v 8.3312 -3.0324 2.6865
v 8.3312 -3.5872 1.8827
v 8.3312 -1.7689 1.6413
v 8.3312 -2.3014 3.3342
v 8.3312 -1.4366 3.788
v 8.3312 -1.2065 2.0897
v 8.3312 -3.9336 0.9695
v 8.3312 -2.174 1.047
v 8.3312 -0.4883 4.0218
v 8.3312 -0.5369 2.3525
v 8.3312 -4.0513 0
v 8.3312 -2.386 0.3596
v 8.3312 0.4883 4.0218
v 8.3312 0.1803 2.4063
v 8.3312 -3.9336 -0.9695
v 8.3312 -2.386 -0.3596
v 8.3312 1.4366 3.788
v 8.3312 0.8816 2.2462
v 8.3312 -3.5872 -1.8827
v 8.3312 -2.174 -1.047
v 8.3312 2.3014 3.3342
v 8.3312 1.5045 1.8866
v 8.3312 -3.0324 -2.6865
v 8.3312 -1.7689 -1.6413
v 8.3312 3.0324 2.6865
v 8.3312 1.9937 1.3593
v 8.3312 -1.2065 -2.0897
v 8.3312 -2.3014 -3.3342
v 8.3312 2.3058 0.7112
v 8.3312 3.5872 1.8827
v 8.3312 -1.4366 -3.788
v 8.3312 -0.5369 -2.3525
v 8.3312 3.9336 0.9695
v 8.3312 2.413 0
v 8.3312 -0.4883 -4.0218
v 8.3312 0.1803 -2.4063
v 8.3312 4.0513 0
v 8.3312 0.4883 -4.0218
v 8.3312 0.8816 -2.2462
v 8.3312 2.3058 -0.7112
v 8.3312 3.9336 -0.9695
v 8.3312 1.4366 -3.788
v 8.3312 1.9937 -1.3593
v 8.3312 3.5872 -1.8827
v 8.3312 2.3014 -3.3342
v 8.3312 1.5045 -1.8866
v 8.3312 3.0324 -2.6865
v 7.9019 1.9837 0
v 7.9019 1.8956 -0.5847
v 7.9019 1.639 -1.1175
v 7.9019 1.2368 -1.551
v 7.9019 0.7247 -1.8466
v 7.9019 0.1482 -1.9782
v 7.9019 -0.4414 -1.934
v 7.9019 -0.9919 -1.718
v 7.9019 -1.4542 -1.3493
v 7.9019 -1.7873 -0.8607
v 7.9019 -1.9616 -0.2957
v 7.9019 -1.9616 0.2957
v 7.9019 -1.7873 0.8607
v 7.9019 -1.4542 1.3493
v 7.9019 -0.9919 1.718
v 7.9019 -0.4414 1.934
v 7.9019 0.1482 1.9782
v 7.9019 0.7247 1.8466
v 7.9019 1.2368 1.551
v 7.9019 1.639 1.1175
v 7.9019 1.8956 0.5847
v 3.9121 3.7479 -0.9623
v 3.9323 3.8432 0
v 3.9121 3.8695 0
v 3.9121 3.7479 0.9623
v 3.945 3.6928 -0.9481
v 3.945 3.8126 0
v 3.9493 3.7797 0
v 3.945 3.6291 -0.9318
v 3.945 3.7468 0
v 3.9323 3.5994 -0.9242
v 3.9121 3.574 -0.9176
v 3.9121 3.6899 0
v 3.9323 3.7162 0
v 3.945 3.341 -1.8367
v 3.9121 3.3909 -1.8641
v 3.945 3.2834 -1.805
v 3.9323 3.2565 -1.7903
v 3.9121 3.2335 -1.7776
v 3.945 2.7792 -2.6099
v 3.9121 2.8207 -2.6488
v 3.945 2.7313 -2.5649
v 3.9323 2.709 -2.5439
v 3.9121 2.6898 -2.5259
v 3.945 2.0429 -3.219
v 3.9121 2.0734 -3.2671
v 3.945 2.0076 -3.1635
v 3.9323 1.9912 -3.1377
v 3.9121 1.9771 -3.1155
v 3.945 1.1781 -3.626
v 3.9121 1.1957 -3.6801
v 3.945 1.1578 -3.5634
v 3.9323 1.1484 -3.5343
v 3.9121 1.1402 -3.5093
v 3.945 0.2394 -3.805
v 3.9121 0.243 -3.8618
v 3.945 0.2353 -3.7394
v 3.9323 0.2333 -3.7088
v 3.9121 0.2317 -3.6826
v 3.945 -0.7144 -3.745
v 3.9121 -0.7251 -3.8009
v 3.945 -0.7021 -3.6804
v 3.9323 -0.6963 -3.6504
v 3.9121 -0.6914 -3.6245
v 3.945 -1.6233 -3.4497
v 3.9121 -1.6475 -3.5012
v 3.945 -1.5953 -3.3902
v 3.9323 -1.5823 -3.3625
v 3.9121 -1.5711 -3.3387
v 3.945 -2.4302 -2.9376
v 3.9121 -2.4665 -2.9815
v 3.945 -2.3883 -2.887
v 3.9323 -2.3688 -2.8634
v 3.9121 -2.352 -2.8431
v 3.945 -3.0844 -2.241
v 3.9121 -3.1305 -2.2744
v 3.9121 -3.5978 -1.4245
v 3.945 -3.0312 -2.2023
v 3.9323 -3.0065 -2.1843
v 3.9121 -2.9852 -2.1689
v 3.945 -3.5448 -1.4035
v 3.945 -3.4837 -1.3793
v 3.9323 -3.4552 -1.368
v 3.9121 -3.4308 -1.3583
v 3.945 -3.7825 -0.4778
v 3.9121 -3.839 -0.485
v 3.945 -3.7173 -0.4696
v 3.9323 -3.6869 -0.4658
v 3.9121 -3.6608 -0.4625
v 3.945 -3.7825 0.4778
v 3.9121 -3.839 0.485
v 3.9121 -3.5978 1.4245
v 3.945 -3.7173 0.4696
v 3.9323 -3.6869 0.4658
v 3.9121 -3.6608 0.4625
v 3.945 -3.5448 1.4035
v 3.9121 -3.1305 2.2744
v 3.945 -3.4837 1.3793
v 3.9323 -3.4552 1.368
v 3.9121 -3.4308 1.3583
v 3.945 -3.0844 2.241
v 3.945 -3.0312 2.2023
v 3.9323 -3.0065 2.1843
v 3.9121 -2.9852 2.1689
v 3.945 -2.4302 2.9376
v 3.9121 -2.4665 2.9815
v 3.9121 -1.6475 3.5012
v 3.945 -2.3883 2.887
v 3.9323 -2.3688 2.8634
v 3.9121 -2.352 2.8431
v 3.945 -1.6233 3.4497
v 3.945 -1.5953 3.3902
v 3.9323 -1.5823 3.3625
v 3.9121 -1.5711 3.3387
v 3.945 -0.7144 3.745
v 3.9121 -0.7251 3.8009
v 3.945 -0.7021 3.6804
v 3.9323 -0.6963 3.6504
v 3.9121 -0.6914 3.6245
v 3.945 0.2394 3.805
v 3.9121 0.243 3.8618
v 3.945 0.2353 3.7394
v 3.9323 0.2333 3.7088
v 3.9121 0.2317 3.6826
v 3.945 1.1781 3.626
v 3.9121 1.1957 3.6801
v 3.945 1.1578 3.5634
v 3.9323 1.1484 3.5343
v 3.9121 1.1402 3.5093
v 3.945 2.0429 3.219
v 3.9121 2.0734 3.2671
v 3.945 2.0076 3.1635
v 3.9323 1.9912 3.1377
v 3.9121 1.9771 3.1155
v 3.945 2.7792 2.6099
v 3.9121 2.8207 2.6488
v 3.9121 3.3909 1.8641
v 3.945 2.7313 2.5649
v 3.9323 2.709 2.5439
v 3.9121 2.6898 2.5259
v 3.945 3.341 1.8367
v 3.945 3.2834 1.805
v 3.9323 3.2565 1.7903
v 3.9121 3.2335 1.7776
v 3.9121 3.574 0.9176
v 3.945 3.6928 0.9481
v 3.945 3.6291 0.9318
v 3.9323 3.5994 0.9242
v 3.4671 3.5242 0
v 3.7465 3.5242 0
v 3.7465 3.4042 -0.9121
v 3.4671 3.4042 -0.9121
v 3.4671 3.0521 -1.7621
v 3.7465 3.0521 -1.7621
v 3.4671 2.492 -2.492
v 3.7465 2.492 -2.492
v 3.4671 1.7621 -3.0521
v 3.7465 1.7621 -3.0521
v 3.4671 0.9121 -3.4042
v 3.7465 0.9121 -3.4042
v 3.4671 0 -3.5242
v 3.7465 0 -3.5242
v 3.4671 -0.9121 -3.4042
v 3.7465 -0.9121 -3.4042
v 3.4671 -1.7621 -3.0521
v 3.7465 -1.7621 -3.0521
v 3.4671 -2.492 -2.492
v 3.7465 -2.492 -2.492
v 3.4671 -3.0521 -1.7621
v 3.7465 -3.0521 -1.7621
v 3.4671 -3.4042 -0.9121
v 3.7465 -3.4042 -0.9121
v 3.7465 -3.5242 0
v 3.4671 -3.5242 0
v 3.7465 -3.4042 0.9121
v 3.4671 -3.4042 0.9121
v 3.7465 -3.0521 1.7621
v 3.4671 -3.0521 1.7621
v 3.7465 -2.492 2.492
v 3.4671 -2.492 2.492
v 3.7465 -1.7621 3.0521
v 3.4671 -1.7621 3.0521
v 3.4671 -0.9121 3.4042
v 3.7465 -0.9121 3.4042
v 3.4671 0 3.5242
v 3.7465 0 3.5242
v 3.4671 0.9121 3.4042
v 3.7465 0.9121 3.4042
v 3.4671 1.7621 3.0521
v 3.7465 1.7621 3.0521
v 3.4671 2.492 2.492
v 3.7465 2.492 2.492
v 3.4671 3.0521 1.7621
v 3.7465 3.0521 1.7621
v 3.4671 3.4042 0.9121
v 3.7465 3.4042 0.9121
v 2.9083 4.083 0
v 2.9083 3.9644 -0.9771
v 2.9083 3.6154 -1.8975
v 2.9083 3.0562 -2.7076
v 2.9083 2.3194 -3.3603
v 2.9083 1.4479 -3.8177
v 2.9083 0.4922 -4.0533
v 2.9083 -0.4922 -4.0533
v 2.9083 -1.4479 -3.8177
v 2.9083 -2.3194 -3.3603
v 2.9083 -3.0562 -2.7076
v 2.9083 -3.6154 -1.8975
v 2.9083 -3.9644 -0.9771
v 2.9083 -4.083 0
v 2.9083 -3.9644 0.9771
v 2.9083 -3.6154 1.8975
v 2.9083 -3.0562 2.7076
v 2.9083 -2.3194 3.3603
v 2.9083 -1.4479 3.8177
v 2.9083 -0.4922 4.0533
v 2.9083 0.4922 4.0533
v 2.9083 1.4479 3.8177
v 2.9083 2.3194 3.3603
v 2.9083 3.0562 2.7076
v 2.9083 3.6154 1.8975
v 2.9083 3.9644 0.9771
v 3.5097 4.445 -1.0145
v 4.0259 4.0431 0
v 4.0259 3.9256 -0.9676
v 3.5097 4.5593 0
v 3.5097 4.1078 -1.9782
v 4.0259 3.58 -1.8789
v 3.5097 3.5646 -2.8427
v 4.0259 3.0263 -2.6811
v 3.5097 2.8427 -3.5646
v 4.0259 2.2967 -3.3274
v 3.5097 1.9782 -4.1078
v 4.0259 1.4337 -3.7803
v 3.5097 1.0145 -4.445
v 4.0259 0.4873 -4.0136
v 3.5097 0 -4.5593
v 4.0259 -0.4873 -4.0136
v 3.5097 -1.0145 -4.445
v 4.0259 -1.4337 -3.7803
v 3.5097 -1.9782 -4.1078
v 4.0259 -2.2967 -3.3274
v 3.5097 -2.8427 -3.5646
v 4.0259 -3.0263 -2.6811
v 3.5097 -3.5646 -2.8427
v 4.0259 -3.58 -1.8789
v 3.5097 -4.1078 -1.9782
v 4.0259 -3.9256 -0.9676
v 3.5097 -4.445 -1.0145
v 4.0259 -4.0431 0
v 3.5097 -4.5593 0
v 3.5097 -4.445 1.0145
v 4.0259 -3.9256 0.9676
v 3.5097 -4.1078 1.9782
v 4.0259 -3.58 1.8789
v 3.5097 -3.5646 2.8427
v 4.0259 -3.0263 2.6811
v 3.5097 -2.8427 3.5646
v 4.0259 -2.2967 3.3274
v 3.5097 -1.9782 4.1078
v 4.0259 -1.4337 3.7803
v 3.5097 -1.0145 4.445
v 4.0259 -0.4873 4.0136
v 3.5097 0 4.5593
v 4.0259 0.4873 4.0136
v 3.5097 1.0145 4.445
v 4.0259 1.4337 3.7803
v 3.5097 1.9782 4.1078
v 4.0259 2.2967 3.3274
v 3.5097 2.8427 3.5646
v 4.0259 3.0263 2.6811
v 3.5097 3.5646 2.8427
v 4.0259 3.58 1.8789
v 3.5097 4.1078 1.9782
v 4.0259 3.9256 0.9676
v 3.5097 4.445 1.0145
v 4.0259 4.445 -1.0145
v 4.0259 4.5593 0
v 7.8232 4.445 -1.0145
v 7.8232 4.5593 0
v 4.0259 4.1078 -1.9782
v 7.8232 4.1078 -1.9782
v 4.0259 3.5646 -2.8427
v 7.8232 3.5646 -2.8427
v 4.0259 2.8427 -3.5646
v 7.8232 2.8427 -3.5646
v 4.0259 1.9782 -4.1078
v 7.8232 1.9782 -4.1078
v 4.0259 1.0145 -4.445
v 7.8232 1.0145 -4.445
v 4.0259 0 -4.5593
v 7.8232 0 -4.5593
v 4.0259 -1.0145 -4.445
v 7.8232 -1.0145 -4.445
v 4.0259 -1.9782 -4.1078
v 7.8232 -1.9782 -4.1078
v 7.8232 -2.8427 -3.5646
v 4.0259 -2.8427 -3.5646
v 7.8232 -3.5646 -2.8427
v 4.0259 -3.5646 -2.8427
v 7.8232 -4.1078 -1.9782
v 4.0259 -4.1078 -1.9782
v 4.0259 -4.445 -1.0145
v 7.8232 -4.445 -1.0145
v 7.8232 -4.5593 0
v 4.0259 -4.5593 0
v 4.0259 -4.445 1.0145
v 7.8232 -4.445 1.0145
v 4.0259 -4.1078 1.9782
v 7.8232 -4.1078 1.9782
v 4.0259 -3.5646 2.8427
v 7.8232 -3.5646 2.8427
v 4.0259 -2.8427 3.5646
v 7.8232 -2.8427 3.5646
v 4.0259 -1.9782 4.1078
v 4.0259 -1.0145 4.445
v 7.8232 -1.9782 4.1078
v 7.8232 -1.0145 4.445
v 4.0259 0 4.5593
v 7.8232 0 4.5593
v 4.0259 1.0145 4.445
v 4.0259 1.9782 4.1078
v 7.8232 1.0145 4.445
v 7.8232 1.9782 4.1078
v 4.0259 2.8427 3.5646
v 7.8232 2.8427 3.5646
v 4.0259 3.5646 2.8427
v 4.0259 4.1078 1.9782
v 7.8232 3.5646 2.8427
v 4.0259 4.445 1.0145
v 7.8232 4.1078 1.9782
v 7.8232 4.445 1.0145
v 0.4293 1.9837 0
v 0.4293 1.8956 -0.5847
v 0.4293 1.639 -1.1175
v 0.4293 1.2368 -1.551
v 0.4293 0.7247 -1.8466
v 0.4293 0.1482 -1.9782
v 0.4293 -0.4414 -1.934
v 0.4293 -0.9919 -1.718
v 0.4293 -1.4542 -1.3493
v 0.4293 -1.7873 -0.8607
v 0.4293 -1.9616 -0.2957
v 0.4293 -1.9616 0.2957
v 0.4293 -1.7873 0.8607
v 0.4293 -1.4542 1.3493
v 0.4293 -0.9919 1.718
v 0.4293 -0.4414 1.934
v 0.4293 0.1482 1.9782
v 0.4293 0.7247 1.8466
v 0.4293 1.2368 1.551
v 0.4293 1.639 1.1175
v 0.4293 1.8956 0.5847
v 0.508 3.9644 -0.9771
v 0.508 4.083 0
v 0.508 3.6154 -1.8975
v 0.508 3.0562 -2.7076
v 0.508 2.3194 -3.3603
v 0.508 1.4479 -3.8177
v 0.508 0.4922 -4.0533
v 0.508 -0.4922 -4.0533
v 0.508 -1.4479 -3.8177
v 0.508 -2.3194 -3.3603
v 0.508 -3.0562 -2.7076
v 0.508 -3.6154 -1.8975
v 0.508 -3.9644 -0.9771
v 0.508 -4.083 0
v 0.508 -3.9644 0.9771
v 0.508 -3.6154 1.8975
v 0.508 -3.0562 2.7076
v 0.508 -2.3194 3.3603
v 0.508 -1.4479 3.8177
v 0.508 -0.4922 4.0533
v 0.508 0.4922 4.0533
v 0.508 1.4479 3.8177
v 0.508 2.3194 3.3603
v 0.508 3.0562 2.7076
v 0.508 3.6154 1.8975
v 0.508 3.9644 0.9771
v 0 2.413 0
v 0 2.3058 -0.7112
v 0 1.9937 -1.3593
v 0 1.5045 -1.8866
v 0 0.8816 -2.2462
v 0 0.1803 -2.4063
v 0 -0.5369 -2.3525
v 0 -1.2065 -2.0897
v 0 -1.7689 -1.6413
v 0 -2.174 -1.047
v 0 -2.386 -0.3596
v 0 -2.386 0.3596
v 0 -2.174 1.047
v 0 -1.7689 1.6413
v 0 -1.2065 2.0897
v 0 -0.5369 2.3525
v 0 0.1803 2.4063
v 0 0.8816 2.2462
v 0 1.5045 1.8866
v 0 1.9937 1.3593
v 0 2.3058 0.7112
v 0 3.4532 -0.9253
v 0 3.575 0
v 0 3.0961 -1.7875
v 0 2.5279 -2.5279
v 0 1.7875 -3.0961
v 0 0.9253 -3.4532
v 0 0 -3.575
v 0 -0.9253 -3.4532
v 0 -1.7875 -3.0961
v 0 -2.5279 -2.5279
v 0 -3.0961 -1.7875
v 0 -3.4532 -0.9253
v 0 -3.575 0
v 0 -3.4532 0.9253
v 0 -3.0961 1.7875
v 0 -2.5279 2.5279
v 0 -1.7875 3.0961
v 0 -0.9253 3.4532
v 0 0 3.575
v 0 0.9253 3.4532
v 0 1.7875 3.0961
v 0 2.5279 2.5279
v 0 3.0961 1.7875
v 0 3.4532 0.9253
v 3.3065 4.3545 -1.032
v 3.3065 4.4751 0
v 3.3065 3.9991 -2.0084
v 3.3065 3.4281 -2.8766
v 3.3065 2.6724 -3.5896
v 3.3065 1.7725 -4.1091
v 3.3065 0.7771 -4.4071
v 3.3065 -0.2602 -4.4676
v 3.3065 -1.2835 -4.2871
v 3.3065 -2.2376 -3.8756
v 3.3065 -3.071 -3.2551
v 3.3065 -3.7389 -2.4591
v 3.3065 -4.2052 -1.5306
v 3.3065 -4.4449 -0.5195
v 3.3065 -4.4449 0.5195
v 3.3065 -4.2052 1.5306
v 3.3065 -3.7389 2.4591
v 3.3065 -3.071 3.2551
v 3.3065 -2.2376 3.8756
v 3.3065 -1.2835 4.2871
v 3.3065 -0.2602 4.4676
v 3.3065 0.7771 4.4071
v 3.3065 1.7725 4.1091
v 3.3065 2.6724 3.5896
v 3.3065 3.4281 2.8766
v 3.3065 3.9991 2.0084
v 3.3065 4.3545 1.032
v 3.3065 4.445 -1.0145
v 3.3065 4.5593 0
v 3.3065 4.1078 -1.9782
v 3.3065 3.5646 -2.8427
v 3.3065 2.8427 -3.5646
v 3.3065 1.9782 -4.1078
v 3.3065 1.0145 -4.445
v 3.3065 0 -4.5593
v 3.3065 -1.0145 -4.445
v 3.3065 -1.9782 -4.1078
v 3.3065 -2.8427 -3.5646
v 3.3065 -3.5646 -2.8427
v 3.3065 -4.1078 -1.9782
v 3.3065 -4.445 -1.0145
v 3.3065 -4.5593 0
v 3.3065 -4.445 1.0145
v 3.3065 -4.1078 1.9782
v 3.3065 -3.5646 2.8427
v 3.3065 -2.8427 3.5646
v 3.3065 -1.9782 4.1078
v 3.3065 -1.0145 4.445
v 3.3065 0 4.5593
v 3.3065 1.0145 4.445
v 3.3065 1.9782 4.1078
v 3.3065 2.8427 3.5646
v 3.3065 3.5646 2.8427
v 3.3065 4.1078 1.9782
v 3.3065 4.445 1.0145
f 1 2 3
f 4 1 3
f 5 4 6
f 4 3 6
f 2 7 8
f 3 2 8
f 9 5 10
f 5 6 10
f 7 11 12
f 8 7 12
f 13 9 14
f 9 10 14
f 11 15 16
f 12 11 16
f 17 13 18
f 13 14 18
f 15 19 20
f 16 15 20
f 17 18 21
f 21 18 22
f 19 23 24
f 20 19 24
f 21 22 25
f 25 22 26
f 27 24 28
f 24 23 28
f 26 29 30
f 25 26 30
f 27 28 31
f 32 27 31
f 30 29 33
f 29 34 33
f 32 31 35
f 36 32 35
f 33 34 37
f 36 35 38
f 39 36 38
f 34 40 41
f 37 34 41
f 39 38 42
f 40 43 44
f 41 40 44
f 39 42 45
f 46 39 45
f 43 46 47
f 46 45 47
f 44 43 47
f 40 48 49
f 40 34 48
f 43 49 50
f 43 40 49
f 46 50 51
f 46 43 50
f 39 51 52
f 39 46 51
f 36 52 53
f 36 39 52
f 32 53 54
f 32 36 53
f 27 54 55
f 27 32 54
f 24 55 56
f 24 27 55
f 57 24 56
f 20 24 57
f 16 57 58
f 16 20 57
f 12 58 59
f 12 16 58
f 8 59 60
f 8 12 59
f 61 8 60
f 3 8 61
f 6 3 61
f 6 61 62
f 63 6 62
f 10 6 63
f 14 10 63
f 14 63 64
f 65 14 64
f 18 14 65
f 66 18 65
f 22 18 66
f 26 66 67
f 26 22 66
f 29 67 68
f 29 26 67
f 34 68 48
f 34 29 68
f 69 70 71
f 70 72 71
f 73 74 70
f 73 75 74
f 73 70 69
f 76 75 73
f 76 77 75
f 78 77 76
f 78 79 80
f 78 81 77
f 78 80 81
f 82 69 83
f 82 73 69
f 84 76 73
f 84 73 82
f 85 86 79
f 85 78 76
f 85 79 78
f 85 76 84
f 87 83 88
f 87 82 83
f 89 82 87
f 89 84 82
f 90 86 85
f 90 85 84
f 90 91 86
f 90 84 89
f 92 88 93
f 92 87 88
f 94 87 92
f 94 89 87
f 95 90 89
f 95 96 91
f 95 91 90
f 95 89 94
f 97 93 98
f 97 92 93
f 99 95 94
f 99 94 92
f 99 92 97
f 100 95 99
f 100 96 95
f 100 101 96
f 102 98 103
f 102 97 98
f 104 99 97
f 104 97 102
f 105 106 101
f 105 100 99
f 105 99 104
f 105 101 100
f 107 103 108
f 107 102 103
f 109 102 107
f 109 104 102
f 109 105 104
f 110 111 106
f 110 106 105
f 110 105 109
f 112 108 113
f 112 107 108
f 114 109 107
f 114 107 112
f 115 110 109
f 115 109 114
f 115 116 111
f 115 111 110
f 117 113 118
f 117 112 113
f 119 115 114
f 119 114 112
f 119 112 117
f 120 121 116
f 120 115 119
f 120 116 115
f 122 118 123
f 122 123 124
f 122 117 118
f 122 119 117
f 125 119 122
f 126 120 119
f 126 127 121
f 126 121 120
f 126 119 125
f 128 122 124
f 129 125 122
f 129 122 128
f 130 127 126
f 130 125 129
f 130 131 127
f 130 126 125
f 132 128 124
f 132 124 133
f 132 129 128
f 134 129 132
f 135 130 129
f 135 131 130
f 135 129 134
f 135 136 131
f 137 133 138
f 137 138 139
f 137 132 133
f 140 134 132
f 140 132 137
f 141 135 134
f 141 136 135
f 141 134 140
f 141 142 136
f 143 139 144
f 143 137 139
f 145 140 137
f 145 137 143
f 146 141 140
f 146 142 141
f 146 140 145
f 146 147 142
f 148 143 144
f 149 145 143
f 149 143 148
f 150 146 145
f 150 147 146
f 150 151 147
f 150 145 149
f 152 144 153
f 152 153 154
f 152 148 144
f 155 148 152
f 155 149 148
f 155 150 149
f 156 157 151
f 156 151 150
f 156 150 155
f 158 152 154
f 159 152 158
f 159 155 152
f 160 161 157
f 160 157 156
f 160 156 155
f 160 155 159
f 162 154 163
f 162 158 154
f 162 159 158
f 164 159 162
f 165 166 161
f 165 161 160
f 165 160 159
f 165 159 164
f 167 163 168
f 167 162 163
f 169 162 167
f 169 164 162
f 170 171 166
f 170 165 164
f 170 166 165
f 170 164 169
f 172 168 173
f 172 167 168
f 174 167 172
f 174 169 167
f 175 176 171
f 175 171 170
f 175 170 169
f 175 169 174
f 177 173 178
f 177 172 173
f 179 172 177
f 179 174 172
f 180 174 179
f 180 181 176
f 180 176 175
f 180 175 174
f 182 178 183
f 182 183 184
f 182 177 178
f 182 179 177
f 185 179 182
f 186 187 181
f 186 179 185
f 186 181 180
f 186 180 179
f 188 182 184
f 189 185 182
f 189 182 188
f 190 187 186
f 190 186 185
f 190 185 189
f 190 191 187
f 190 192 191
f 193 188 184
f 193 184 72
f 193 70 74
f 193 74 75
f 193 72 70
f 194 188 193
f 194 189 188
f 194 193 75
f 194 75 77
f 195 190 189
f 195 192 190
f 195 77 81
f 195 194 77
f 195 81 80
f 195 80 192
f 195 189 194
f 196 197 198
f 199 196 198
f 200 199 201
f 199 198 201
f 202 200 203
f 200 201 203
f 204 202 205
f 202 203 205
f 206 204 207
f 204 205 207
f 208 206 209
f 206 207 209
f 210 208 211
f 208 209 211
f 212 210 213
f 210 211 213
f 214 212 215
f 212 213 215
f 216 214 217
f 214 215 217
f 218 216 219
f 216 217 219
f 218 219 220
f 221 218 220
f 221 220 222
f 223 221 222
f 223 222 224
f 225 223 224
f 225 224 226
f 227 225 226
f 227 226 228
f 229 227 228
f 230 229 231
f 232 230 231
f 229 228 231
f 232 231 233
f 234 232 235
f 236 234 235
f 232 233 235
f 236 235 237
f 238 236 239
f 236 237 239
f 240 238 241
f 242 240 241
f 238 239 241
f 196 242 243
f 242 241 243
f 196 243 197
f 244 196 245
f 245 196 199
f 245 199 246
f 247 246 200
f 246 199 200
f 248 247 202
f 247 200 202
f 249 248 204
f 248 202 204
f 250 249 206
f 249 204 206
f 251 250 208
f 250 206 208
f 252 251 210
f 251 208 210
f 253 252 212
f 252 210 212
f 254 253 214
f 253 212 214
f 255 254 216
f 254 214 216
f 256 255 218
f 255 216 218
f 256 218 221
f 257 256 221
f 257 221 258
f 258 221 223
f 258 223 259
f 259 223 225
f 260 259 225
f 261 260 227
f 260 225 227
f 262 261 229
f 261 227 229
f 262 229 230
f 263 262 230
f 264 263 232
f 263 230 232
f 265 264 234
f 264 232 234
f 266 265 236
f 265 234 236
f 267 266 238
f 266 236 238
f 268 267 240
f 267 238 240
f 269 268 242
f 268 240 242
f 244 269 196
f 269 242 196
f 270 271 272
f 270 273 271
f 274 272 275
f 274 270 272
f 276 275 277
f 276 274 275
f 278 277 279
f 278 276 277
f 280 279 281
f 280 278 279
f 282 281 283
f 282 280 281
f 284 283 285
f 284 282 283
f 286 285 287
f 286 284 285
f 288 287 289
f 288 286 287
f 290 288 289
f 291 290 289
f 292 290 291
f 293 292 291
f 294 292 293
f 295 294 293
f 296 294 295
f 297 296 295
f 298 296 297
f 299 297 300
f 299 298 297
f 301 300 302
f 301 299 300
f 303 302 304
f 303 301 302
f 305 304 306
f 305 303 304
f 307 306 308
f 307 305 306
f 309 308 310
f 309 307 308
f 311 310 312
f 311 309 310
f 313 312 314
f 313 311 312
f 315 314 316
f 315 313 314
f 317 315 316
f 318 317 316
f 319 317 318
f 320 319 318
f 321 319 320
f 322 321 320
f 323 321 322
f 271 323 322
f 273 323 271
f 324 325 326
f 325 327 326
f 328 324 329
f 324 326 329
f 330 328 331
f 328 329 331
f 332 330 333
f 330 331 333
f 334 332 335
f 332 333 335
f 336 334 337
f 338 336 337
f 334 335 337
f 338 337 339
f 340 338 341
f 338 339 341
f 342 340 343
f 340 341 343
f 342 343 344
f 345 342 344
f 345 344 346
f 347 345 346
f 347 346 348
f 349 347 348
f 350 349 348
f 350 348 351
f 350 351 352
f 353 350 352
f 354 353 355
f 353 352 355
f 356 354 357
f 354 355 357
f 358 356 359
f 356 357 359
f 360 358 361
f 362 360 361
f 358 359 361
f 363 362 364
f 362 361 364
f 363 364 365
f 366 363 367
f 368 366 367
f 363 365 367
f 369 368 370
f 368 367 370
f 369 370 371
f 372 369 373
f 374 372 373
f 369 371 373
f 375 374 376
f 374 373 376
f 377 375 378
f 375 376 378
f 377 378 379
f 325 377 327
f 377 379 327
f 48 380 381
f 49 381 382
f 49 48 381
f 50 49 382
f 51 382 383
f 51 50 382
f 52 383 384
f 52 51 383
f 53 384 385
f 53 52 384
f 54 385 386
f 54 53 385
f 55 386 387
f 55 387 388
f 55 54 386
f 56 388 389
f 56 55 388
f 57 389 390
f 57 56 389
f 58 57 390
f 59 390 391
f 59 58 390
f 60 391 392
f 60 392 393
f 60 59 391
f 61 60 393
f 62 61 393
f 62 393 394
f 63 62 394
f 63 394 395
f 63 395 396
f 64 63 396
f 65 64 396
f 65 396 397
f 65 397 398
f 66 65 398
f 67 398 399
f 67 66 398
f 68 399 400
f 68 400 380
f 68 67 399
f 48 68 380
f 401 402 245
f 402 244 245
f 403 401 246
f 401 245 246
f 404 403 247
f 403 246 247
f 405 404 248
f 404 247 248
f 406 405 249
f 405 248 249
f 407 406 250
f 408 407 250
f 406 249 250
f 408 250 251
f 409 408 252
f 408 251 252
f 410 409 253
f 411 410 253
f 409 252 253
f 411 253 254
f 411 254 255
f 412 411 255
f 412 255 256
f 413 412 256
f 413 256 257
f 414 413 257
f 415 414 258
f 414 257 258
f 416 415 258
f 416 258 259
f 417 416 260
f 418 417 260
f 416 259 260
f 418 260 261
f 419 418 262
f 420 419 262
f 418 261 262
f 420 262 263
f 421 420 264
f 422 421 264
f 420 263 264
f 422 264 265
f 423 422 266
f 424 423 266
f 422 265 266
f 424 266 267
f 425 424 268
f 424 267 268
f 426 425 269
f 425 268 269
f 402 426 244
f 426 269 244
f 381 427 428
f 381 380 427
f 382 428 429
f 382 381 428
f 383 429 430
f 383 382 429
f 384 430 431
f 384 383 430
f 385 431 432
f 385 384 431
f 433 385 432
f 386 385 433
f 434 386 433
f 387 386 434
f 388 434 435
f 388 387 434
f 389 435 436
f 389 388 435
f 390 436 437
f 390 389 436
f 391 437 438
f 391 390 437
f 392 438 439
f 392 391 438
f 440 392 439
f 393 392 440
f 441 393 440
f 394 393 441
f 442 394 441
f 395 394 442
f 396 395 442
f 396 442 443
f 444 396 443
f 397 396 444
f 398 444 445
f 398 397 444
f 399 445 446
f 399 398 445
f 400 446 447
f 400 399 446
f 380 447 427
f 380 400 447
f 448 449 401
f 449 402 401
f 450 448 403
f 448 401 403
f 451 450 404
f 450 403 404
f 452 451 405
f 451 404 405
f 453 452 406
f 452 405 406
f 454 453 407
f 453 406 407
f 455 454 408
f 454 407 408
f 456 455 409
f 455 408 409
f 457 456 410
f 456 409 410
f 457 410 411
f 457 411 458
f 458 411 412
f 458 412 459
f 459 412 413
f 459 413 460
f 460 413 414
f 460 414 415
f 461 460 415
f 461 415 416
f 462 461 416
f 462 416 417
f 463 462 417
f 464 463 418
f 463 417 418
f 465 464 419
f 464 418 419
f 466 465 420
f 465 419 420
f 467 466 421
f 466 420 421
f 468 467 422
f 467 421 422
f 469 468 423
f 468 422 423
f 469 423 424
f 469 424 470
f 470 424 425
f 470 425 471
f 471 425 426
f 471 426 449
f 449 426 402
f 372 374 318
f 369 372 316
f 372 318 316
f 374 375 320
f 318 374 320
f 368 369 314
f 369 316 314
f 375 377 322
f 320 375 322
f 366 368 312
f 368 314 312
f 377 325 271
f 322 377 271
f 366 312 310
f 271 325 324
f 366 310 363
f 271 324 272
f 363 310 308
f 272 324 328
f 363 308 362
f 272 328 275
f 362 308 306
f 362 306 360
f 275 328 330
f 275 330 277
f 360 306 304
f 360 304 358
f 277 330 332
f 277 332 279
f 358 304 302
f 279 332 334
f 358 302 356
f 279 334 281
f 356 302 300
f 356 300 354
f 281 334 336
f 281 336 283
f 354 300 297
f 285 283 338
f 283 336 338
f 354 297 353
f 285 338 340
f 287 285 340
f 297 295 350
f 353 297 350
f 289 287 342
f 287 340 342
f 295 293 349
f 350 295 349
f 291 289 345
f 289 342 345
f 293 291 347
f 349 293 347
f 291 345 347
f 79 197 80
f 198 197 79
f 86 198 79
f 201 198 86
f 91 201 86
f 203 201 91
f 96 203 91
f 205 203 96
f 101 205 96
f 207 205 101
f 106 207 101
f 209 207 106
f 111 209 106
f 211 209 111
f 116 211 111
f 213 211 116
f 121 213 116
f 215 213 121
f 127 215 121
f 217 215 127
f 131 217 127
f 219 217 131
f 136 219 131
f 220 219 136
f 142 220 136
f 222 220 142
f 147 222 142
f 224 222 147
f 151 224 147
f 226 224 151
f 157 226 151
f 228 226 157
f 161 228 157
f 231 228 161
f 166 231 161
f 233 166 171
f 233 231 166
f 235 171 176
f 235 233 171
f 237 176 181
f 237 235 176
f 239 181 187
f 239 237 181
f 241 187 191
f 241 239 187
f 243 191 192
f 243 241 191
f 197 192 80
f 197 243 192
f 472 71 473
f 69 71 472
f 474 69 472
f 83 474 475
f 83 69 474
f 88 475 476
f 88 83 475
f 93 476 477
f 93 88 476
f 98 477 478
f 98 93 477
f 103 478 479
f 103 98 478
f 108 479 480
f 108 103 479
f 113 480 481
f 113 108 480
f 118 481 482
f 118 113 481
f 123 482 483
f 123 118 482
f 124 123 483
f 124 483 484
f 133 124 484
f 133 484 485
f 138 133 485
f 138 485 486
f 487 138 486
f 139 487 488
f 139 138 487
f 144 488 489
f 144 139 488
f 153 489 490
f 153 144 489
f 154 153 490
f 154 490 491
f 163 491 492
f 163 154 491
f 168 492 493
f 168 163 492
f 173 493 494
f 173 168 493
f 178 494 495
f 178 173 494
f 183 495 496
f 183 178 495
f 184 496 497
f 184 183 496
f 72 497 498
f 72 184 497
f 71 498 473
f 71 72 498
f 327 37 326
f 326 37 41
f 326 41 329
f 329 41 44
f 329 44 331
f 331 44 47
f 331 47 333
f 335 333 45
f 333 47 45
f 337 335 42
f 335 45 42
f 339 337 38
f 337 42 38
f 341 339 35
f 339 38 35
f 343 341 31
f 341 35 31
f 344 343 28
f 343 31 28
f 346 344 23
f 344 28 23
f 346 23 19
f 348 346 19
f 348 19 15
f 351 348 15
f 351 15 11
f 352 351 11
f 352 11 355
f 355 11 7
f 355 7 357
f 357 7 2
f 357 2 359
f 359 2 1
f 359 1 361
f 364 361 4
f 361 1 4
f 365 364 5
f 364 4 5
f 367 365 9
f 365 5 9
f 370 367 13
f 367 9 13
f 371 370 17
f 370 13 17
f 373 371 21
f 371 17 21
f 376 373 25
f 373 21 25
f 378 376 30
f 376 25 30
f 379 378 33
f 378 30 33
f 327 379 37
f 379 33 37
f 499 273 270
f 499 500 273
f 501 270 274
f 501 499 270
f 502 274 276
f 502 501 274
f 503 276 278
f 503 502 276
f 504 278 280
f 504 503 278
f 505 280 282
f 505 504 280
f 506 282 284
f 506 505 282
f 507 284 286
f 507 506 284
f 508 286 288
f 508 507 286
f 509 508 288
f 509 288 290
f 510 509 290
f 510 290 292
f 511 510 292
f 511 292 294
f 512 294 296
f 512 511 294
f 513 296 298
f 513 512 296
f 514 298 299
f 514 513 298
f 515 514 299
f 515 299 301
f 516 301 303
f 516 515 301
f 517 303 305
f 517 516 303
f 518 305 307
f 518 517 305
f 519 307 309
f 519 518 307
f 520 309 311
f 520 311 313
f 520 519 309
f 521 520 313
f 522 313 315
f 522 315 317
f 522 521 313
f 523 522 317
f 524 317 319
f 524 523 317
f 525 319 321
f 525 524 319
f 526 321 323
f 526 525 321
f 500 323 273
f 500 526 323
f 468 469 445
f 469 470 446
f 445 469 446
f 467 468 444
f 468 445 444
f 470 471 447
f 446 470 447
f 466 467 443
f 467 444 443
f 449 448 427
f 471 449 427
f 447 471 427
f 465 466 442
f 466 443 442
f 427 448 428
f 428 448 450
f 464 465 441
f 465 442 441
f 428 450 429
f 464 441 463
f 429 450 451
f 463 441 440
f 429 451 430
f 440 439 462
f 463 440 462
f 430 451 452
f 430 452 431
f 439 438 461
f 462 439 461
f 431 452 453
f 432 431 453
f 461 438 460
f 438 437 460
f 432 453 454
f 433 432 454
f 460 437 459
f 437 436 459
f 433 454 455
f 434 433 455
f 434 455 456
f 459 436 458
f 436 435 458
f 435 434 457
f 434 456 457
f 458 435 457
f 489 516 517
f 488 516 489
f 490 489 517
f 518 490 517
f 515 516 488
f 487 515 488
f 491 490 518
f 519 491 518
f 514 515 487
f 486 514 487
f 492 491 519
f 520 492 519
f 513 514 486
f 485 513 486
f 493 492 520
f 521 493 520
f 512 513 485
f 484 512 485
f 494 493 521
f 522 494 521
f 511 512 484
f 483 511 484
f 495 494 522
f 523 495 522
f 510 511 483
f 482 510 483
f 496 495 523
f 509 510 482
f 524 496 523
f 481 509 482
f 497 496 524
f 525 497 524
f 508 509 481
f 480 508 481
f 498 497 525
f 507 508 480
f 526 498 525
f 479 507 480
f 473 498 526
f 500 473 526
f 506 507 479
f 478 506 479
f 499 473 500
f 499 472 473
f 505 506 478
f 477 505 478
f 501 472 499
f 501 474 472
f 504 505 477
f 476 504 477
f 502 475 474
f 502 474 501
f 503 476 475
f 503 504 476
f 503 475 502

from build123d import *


with BuildPart() as part:
    # Sketch1 → Revolve1 (revolve)
    with BuildSketch(Plane.XY):
        Polygon((0, 0), (0, 3.57505), (0.508, 4.08305), (2.9083, 4.08305), (3.4671, 3.52425), (4.0259, 3.52425), (4.0259, 4.5593), (7.8232, 4.5593), (8.3312, 4.0513), (8.3312, 0), align=None)
    revolve(axis=Axis((8.3312, 0, 0), (-1, 0, 0)))

    # Sketch2 → Cut-Revolve1 (revolve, cut)
    with BuildSketch(Plane.XY):
        Polygon((0, 0), (0, 2.413), (0.42926, 1.98374), (7.90194, 1.98374), (8.3312, 2.413), (8.3312, 0), align=None)
    revolve(axis=Axis((8.3312, 0, 0), (-1, 0, 0)), mode=Mode.SUBTRACT)

    # Sketch3 → Revolve2 (revolve)
    with BuildSketch(Plane.XY):
        with BuildLine():
            Line((3.306480735, 4.475131804), (3.912128708, 3.869483831))
            ThreePointArc((3.912128708, 3.869483831), (3.949326147, 3.779681269), (3.912128708, 3.689878708))
            Line((3.912128708, 3.689878708), (3.7465, 3.52425))
            Line((3.7465, 3.52425), (3.4671, 3.52425))
            Line((3.4671, 3.52425), (3.4671, 3.27025))
            Line((3.4671, 3.27025), (4.0259, 3.27025))
            Line((4.0259, 3.27025), (4.0259, 4.043080735))
            Line((4.0259, 4.043080735), (3.509680735, 4.5593))
            Line((3.509680735, 4.5593), (3.306480735, 4.5593))
            Line((3.306480735, 4.5593), (3.306480735, 4.475131804))
        make_face()
    revolve(axis=Axis((4.0259, 0, 0), (-1, 0, 0)))


solid = part.part
